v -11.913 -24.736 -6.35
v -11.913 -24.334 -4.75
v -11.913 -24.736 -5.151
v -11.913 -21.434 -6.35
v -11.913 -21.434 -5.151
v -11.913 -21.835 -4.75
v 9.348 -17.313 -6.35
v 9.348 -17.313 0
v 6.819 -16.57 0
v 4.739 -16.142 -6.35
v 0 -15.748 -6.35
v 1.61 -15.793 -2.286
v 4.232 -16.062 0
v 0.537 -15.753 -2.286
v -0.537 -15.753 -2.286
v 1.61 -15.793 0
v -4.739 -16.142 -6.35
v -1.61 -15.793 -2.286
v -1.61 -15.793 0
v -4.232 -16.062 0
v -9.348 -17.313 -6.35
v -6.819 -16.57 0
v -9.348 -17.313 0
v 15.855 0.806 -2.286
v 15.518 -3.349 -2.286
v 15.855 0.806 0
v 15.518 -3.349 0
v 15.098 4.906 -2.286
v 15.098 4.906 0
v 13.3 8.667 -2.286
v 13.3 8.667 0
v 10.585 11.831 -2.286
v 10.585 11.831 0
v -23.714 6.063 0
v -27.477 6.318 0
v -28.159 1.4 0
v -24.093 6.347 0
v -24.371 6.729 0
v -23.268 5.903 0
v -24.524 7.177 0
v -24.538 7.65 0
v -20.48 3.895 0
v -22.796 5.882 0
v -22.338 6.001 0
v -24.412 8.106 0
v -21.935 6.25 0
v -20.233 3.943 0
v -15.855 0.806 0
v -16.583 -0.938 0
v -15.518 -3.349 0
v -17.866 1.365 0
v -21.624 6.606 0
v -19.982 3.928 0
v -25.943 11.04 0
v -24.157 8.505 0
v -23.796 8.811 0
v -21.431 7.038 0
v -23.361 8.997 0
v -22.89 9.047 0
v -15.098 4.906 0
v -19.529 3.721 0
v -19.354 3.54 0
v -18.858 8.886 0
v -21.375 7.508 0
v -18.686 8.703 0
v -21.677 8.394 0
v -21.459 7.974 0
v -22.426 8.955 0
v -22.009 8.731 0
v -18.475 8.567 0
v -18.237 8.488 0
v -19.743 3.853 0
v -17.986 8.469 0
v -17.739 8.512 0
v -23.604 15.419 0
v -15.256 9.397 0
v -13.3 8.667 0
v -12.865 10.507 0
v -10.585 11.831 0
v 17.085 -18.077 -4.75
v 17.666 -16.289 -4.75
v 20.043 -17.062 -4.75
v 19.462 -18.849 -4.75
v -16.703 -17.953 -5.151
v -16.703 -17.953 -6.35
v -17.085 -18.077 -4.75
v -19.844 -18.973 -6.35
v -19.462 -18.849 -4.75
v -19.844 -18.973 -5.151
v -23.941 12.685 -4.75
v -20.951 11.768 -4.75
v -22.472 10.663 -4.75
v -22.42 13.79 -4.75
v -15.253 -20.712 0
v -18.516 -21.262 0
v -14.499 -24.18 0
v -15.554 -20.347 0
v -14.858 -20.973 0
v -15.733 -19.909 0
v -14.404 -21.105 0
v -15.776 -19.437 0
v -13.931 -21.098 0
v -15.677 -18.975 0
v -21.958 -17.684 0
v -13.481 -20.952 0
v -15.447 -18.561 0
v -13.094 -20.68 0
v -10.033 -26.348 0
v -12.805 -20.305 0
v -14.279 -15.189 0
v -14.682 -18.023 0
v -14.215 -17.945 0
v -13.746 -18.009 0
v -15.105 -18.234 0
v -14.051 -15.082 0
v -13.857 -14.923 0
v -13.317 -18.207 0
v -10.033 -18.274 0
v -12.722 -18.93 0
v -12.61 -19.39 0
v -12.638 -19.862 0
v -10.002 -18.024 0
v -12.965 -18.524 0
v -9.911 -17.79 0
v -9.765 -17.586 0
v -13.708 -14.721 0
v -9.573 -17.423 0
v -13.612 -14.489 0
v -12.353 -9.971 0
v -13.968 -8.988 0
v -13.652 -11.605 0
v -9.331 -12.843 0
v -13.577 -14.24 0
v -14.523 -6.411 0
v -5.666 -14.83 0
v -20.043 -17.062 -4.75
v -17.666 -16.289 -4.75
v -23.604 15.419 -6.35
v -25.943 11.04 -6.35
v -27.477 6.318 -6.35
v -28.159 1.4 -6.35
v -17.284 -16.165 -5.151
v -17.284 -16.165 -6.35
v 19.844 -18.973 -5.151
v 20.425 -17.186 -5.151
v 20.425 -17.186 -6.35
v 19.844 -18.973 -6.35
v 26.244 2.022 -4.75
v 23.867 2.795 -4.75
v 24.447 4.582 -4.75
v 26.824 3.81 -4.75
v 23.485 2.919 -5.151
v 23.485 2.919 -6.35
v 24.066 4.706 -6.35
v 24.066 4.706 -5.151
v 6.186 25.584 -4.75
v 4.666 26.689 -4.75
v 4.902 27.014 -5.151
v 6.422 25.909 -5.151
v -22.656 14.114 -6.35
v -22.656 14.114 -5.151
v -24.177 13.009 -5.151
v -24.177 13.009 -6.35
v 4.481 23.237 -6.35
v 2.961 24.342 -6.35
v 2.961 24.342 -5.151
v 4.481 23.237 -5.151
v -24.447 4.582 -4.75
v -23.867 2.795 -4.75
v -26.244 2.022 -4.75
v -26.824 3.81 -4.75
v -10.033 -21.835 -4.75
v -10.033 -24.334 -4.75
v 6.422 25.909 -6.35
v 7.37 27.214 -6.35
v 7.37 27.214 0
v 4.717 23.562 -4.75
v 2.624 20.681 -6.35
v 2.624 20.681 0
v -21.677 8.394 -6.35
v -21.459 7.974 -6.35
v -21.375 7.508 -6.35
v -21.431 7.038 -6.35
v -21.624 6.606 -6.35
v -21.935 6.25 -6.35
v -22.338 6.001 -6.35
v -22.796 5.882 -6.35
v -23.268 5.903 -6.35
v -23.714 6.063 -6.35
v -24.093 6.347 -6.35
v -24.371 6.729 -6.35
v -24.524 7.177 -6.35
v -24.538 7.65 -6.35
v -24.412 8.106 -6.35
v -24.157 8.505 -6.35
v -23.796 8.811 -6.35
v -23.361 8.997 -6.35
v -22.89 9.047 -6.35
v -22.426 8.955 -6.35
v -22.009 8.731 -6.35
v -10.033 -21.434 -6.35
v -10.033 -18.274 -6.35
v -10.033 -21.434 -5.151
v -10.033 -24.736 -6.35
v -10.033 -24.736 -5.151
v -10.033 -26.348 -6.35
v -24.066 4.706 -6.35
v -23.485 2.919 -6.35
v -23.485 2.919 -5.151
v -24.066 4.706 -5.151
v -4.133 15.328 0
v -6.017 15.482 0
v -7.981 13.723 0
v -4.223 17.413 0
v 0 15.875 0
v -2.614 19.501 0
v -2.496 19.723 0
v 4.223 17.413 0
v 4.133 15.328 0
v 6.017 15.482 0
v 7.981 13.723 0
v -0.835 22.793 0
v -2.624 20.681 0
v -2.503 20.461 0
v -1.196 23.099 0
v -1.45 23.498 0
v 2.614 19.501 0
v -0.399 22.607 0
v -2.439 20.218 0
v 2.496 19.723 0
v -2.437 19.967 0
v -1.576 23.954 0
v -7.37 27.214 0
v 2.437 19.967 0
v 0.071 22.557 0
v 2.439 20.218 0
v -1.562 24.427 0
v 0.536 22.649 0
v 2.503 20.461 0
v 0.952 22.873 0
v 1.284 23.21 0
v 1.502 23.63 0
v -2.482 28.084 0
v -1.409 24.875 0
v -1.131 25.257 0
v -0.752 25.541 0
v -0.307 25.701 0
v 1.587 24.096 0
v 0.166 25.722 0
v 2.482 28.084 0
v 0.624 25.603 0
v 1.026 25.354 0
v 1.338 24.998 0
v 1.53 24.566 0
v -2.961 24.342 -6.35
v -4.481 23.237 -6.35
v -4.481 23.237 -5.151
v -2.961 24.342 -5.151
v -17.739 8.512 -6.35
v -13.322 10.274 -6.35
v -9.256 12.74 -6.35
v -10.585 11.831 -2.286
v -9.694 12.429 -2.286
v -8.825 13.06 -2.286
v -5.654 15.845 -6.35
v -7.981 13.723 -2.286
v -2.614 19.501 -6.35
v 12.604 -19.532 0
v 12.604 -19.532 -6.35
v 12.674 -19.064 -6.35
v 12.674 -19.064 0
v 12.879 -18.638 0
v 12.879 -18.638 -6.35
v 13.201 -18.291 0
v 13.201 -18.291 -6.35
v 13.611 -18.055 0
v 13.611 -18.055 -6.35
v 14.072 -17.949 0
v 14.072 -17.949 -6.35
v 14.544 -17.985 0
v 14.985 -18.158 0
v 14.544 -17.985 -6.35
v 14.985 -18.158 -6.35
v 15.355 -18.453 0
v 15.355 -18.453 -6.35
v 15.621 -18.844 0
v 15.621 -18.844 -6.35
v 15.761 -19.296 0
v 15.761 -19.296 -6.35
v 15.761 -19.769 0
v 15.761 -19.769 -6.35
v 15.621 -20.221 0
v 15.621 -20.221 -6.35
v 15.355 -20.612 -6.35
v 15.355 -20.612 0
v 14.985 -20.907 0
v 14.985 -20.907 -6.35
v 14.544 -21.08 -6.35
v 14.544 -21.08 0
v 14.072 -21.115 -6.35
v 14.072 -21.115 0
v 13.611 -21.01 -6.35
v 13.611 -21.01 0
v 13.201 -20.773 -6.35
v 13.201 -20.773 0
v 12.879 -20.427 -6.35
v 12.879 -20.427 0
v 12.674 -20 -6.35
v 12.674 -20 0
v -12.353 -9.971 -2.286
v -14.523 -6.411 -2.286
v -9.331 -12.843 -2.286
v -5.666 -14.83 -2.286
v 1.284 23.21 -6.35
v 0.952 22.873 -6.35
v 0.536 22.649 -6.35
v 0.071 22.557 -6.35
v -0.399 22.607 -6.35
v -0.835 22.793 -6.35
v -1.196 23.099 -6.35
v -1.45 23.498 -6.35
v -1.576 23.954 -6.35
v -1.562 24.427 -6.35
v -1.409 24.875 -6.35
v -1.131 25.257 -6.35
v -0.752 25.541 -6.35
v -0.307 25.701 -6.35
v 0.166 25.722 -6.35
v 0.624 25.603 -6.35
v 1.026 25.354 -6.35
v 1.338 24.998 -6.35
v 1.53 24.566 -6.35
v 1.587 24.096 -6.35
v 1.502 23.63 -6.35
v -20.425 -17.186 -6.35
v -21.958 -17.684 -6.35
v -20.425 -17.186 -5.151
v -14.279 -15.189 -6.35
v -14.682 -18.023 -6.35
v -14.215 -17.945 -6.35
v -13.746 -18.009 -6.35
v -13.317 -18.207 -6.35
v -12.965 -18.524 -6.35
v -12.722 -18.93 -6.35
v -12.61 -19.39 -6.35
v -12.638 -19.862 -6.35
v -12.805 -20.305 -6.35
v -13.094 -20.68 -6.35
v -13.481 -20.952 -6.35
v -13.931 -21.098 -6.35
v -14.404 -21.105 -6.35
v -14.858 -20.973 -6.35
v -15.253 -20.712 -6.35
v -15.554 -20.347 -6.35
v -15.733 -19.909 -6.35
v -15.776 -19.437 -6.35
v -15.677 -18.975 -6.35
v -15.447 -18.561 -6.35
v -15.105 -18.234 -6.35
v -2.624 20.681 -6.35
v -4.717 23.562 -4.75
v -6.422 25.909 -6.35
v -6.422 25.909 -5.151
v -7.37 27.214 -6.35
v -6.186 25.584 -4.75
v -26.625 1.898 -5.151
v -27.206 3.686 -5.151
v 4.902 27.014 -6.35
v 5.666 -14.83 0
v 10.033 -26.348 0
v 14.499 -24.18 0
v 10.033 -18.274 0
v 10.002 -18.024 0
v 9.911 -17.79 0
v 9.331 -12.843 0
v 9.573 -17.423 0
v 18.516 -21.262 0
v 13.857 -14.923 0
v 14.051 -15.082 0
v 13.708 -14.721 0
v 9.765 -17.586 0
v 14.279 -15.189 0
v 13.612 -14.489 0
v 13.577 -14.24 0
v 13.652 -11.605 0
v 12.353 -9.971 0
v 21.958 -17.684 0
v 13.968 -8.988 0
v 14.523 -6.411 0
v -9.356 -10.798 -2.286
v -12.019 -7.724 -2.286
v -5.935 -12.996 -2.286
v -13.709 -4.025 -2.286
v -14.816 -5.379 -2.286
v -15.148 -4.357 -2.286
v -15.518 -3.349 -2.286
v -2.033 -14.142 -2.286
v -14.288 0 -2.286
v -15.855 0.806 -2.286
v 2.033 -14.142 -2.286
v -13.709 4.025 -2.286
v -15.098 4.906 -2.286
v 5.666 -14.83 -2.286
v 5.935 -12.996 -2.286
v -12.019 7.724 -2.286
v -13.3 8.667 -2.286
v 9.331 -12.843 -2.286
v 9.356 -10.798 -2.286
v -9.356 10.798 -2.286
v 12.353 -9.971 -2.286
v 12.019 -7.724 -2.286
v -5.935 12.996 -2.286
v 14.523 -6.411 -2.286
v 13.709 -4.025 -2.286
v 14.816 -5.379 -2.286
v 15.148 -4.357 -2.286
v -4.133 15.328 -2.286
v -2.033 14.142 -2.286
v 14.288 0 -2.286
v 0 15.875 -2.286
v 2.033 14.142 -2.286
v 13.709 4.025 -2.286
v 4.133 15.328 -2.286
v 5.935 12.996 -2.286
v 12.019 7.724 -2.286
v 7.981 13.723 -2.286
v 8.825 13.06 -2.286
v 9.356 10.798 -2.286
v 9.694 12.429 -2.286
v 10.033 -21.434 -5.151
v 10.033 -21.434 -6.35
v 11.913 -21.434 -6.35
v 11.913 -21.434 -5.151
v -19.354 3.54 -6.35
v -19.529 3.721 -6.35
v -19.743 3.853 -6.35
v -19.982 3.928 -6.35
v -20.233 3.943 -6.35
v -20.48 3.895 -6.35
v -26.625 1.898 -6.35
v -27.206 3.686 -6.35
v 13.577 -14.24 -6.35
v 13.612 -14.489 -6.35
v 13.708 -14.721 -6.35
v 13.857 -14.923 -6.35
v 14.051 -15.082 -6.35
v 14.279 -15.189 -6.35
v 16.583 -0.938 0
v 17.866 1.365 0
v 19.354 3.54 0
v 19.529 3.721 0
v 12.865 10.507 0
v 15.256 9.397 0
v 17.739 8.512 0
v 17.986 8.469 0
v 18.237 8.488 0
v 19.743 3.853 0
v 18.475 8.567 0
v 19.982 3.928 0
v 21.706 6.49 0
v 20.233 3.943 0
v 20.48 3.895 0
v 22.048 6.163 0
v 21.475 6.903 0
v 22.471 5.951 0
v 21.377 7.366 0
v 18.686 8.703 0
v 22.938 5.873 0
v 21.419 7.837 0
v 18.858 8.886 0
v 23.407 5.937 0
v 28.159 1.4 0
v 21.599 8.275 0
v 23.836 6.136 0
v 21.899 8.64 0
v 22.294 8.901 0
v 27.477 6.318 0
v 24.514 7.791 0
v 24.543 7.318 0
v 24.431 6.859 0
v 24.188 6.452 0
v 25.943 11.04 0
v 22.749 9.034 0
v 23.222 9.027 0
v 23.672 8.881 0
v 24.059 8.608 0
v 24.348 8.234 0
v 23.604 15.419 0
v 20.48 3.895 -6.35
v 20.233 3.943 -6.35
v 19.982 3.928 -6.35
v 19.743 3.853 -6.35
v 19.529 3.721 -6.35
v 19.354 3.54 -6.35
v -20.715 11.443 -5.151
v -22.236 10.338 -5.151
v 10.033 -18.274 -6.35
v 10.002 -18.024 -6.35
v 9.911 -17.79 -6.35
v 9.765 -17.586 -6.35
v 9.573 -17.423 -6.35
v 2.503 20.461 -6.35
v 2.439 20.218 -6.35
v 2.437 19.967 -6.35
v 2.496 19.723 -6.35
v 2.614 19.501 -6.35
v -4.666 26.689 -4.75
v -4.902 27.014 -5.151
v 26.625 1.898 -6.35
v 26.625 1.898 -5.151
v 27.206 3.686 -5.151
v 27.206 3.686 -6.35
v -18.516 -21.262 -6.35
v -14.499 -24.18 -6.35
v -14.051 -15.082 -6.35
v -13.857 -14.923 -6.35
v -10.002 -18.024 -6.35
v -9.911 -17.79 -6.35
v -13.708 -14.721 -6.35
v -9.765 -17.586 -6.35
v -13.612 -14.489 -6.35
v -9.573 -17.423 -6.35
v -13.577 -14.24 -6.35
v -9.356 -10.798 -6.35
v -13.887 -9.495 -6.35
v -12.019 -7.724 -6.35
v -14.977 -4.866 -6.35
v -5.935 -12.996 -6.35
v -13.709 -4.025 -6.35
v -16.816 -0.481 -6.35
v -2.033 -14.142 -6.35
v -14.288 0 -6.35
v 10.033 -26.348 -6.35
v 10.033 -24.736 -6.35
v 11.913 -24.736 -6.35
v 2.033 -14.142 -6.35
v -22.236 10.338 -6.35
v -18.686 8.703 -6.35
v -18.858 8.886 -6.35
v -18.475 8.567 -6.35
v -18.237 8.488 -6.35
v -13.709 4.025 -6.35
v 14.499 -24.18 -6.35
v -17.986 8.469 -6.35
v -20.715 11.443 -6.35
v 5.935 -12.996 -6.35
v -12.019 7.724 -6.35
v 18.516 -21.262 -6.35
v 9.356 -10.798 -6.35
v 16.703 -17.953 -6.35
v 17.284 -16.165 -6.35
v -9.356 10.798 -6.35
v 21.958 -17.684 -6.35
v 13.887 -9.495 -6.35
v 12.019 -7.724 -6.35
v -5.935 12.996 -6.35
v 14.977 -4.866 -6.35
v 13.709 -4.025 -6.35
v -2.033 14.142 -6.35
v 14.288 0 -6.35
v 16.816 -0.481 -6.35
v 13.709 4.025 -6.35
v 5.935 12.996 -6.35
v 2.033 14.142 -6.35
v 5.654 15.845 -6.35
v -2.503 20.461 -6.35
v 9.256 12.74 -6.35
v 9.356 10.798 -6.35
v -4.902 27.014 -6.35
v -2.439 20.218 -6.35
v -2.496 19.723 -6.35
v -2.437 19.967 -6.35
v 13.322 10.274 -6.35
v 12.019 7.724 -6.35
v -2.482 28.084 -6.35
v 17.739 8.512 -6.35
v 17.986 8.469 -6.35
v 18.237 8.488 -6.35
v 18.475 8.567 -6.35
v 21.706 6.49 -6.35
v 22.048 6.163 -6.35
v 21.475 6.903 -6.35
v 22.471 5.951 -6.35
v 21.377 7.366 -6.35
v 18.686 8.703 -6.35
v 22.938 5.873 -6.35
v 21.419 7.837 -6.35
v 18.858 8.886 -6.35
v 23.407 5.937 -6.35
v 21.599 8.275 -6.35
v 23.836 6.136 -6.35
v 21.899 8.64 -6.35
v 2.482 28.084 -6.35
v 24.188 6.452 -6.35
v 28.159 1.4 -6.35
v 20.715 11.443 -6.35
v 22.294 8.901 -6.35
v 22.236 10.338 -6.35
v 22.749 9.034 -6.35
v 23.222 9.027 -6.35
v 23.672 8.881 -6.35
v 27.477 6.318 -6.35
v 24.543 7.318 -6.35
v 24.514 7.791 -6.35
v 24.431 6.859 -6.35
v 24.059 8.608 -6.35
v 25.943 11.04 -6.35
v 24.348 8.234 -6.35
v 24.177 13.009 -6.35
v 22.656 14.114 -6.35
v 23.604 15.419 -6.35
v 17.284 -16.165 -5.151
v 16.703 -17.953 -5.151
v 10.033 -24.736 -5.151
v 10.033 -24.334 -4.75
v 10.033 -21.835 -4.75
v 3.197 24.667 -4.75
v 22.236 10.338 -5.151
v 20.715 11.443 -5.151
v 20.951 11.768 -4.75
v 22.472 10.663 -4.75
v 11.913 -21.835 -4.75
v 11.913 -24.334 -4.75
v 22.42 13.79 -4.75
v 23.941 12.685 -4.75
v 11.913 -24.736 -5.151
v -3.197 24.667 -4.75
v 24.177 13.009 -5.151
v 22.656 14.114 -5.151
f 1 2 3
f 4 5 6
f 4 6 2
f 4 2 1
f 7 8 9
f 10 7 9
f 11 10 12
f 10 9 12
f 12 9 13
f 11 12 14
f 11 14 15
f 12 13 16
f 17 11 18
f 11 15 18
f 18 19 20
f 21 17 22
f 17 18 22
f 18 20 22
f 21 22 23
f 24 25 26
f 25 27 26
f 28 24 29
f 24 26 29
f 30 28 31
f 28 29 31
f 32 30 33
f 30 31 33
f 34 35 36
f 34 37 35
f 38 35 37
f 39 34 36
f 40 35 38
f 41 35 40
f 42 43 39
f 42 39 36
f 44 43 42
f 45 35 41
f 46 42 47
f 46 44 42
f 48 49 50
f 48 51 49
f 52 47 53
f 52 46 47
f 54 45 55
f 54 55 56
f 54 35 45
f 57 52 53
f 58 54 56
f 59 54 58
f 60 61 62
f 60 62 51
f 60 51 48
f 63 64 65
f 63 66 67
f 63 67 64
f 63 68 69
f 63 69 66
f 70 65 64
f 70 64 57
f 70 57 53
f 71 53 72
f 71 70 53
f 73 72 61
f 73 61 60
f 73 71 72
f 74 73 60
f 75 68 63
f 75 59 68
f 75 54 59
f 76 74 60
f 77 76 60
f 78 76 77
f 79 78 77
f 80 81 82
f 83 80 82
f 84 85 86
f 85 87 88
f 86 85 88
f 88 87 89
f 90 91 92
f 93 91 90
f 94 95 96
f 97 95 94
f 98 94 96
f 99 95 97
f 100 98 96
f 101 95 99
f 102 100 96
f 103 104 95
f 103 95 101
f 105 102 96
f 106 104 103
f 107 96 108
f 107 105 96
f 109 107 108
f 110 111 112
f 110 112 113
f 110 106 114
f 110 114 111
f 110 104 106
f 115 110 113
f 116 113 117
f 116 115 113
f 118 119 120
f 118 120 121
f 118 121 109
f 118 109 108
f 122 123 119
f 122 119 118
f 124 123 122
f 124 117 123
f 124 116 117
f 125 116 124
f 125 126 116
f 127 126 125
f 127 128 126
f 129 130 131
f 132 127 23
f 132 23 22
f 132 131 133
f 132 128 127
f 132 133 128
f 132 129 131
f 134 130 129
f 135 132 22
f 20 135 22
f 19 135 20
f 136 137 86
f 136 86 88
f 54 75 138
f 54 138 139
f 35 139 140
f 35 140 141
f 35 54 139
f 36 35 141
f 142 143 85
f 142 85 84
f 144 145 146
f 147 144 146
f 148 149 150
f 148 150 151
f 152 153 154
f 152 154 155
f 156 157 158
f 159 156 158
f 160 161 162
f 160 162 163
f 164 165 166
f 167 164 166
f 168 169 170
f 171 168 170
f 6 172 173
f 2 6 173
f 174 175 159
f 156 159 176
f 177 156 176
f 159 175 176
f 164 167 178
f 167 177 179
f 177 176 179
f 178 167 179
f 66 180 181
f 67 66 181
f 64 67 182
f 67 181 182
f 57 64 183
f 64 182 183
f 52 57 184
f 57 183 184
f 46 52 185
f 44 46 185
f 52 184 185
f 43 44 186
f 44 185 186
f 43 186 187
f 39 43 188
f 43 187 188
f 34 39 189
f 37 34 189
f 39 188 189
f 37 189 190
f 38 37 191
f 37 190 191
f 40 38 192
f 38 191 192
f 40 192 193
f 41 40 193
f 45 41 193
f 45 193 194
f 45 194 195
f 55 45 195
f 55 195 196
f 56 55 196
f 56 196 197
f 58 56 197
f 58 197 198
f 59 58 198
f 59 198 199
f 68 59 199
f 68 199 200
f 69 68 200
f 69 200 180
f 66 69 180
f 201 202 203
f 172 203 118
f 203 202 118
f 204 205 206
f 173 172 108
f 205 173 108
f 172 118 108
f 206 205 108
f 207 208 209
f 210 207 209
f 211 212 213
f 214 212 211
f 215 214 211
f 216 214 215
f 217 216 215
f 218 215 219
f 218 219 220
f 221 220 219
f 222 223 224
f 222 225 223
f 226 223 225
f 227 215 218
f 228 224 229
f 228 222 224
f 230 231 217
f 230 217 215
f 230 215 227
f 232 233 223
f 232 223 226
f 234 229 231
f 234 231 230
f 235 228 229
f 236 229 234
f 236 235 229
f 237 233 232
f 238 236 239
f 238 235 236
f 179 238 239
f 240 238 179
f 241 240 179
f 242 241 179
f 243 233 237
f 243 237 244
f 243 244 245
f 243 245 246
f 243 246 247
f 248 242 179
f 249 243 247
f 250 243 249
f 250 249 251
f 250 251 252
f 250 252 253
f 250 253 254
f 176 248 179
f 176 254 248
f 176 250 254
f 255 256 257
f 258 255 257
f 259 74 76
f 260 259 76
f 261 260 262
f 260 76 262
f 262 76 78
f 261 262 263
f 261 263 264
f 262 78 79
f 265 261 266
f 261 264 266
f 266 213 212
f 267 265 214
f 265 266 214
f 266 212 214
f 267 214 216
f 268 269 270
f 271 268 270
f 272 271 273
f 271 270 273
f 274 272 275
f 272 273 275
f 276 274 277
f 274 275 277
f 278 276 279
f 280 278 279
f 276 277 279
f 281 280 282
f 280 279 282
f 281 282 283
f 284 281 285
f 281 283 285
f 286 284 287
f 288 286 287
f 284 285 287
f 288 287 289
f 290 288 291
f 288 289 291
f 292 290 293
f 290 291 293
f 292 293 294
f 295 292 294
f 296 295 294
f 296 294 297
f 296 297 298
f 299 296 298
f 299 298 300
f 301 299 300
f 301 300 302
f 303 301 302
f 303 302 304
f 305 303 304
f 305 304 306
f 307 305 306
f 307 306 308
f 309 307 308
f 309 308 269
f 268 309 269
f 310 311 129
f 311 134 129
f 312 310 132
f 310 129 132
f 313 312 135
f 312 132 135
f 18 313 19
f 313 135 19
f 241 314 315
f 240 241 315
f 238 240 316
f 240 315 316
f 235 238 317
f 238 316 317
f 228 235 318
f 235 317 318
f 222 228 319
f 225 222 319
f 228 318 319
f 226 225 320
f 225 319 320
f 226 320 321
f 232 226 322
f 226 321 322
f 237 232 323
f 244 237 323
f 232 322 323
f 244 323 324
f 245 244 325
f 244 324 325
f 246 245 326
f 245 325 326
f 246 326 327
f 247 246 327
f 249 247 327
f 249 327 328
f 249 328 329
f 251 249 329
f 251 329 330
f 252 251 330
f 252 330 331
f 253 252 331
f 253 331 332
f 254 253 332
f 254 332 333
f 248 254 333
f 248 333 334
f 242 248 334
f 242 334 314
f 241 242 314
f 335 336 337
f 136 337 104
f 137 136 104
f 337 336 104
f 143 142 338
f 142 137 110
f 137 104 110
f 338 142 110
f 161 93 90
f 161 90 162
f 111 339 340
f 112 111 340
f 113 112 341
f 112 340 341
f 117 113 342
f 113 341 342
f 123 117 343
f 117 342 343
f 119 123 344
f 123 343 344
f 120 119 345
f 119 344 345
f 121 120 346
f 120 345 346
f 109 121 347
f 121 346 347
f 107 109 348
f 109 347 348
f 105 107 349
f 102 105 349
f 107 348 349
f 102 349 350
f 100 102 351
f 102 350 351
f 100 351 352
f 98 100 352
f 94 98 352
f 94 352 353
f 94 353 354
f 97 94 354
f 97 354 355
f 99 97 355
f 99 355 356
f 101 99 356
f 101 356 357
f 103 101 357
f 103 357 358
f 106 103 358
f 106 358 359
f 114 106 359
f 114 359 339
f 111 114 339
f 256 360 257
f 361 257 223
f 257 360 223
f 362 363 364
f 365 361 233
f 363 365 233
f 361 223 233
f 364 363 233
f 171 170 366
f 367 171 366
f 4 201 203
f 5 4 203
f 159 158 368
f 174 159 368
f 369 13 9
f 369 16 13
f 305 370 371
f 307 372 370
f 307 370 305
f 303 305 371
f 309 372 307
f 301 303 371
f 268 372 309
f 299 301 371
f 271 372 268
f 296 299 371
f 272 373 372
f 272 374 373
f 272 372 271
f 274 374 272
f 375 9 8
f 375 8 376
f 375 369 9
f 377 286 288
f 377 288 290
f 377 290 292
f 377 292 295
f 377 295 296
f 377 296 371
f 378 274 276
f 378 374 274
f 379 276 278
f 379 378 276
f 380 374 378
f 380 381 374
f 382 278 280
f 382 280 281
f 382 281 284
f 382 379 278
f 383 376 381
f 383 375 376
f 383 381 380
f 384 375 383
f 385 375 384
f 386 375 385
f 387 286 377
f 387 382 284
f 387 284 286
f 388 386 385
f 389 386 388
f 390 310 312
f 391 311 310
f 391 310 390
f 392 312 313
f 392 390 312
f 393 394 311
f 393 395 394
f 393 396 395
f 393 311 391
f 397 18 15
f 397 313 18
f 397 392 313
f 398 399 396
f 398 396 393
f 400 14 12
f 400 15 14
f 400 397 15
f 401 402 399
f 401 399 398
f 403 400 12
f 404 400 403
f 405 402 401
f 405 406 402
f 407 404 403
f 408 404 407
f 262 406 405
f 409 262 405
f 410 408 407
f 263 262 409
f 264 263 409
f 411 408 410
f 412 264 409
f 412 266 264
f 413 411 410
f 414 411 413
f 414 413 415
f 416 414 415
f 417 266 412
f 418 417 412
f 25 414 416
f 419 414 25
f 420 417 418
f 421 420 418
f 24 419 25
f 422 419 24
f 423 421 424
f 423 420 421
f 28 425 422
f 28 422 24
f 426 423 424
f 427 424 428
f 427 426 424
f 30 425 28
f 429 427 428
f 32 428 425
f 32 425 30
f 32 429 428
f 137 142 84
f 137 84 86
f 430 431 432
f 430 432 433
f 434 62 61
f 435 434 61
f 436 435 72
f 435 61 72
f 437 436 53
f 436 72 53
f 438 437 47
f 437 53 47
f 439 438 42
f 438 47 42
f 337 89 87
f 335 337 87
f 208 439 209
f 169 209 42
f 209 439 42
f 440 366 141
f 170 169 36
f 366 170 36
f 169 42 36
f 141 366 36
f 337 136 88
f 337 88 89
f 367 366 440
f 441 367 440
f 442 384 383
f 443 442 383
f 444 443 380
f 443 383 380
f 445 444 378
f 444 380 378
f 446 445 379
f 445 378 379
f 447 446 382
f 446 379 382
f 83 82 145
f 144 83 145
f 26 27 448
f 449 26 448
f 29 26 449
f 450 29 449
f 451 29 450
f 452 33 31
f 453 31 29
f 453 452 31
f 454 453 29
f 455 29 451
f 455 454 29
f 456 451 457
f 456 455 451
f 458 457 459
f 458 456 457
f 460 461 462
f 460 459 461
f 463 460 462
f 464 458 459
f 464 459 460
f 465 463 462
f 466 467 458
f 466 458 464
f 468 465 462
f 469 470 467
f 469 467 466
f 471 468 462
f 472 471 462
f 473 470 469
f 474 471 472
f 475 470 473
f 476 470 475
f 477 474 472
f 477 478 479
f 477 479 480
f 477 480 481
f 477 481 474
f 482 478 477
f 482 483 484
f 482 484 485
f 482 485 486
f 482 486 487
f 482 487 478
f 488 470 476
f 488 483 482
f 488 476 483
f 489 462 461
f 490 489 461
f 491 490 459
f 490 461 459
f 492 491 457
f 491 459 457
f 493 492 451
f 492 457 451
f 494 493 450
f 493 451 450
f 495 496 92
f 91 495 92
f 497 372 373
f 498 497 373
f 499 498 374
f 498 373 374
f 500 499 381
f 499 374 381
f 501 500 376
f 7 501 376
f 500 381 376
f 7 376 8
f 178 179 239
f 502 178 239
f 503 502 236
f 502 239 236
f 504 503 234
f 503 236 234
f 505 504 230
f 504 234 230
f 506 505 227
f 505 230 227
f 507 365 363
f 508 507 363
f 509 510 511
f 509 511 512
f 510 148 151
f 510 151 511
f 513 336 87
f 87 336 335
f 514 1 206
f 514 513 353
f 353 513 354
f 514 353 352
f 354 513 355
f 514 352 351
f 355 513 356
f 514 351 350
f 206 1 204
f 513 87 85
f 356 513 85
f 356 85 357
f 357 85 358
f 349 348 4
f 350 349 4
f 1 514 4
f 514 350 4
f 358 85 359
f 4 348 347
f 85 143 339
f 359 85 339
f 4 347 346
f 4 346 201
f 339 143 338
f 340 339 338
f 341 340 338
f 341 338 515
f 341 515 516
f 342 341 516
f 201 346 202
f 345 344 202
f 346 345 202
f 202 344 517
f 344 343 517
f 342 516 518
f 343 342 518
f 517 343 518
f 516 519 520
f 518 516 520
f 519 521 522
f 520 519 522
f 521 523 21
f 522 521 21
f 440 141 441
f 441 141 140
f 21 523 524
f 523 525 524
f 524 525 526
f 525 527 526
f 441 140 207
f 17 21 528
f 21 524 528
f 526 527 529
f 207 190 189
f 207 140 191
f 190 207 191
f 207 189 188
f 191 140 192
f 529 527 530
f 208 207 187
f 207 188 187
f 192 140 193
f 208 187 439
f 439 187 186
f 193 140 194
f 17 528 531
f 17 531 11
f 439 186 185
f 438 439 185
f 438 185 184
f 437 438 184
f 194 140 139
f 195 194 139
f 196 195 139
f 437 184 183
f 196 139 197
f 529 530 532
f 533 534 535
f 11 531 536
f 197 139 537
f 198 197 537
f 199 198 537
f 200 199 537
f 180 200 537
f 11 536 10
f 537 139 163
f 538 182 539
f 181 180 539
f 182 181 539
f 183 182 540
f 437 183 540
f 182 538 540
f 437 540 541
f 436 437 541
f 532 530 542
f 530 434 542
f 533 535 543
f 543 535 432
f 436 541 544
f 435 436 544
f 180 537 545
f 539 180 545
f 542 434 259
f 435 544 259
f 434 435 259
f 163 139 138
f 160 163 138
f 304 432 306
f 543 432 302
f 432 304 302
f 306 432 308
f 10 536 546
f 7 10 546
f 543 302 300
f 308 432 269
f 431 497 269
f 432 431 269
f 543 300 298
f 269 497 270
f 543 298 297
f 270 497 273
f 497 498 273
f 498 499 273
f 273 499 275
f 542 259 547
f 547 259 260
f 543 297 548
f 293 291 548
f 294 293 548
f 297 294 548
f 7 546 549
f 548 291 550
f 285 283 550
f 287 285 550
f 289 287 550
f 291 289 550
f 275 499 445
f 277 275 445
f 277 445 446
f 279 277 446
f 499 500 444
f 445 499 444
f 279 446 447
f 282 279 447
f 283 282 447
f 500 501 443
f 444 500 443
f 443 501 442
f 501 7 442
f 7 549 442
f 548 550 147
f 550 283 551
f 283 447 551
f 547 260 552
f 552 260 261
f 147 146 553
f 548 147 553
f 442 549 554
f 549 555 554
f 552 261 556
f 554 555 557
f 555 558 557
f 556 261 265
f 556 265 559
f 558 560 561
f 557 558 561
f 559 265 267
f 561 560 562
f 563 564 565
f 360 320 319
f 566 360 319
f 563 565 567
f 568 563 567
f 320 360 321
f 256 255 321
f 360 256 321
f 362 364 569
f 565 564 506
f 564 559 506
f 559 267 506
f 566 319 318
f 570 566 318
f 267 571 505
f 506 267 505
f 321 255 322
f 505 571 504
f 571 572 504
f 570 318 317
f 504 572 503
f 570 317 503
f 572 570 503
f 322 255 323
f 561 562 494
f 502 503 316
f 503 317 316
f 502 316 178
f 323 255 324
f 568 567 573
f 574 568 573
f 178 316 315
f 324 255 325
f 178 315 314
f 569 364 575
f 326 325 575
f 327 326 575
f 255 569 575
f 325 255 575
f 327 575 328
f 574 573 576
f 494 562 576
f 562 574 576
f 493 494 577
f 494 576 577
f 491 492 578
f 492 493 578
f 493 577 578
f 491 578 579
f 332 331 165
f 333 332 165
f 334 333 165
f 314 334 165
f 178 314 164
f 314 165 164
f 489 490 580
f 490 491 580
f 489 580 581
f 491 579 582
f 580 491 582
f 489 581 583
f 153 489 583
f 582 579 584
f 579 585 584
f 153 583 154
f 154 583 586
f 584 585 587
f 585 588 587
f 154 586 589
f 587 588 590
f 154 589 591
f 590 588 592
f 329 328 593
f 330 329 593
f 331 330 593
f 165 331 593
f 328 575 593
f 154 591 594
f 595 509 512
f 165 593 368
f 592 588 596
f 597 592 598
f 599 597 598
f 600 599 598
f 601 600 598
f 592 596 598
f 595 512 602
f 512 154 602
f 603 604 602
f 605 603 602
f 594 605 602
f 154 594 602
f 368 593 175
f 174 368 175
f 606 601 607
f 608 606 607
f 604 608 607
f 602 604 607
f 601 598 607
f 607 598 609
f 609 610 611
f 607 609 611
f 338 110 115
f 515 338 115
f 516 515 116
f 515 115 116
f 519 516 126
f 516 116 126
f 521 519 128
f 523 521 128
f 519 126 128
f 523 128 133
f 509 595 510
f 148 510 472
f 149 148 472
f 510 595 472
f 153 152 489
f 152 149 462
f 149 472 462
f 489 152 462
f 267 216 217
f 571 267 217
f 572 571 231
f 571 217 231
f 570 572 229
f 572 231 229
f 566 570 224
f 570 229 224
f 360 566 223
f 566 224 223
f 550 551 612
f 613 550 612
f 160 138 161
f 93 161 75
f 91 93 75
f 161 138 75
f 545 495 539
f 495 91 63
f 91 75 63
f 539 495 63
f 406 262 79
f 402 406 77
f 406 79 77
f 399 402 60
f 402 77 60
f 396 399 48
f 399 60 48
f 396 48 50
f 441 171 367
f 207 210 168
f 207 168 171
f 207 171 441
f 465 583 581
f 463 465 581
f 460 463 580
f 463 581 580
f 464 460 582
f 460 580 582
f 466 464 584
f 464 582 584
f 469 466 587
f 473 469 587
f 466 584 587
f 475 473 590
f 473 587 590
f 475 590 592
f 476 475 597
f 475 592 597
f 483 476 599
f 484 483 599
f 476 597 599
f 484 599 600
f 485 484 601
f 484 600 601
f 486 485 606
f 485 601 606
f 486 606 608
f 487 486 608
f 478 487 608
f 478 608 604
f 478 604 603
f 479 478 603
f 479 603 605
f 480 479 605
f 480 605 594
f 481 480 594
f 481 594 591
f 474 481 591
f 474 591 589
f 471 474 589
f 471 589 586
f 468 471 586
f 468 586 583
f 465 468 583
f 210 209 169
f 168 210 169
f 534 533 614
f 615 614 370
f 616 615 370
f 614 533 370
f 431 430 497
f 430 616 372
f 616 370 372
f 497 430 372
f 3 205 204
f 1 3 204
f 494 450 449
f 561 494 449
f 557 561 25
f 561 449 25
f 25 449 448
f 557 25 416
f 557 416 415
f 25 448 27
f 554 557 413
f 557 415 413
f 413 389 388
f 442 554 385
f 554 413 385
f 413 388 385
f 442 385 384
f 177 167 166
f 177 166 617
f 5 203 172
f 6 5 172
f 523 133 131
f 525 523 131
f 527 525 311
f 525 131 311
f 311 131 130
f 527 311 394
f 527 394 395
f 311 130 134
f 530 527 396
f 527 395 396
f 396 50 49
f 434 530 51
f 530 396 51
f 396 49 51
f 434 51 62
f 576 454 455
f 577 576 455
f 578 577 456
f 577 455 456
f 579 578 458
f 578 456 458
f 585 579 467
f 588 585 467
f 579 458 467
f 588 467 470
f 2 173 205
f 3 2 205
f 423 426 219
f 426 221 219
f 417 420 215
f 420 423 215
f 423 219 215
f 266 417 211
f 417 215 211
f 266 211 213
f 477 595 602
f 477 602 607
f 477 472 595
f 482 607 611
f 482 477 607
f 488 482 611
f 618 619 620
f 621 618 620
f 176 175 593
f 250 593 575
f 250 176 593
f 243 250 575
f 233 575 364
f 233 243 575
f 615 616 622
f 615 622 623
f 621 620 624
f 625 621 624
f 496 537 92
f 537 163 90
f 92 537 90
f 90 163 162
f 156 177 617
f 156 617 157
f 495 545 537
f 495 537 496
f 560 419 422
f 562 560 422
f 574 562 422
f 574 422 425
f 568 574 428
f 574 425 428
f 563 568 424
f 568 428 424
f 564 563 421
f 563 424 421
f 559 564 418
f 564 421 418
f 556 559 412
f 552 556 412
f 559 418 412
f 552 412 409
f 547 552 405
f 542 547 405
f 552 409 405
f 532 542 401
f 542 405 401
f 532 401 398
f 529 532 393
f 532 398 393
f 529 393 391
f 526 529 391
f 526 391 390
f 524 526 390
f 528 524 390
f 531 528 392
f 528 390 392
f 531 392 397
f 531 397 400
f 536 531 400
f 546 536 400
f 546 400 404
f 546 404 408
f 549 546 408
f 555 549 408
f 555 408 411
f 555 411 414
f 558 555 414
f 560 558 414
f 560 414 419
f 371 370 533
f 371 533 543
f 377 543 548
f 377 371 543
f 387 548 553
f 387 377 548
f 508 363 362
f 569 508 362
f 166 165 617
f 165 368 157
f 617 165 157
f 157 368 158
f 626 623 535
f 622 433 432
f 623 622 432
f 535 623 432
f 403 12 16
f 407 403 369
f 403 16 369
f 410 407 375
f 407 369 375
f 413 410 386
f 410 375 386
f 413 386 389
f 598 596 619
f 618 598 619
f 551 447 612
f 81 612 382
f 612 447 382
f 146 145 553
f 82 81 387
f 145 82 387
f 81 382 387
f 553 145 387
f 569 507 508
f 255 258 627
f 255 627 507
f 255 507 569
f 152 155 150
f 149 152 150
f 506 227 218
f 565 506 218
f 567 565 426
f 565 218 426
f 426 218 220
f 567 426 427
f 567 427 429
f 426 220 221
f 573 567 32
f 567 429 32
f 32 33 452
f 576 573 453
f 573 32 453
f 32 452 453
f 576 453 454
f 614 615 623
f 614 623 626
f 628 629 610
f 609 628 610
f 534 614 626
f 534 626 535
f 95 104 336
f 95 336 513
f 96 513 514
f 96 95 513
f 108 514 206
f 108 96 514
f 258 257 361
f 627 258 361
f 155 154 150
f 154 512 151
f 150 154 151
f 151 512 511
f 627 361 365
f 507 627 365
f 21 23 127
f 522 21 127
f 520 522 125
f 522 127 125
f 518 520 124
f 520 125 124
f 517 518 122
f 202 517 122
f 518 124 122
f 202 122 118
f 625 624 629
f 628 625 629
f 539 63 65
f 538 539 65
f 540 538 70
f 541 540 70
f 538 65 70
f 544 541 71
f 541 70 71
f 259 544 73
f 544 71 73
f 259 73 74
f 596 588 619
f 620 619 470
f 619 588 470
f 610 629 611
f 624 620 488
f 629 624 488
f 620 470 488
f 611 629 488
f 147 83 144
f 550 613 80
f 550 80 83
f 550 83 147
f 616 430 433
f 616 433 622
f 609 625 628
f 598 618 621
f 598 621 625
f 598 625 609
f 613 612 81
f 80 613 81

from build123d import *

# Parameters (mm, degrees)
SKETCH1_R                = 28.194
SKETCH1_R_2              = 14.2875
BOSS_EXTRUDE1_DEPTH      = 6.35
SKETCH1_3_R              = 15.875
SKETCH1_3_R_2            = 14.2875
CUT_EXTRUDE1_DEPTH       = 2.286
CUT_EXTRUDE5_DEPTH       = 41.374816062
CIRPATTERN1_COUNT        = 5
CUT_EXTRUDE6_DEPTH       = 1.8796
CIRPATTERN2_COUNT        = 5
CIRPATTERN2_COPY_1_DEPTH = 1.8796
CIRPATTERN2_COPY_2_DEPTH = 1.8796
CIRPATTERN2_COPY_3_DEPTH = 1.8796
CIRPATTERN2_COPY_4_DEPTH = 1.8796
SKETCH4_R                = 1.5875
CUT_EXTRUDE7_DEPTH       = 41.350542006
CIRPATTERN3_COUNT        = 5


with BuildPart() as part:
    # Sketch1 → Boss-Extrude1 (new body)
    with BuildSketch(Plane.XY):
        Circle(SKETCH1_R)
        Circle(SKETCH1_R_2, mode=Mode.SUBTRACT)
    extrude(amount=-BOSS_EXTRUDE1_DEPTH)

    # Sketch1<3> → Cut-Extrude1 (cut)
    with BuildSketch(Plane.XY):
        Circle(SKETCH1_3_R)
        Circle(SKETCH1_3_R_2, mode=Mode.SUBTRACT)
    extrude(amount=-CUT_EXTRUDE1_DEPTH, mode=Mode.SUBTRACT)

    # Sketch2 → Cut-Extrude5 (cut, through all)
    with BuildSketch(Plane.XY):
        with BuildLine():
            Line((-10.033, -28.194), (10.033, -28.194))
            Line((10.033, -28.194), (10.033, -18.273516145))
            ThreePointArc((10.033, -18.273516145), (9.84417878, -17.683574397), (9.347899083, -17.312911233))
            ThreePointArc((9.347899083, -17.312911233), (0, -15.748), (-9.347899083, -17.312911233))
            ThreePointArc((-9.347899083, -17.312911233), (-9.84417878, -17.683574397), (-10.033, -18.273516145))
            Line((-10.033, -18.273516145), (-10.033, -28.194))
        make_face()
    cut_extrude5 = extrude(amount=-CUT_EXTRUDE5_DEPTH, mode=Mode.SUBTRACT)

    # CirPattern1: Cut-Extrude5 ×5 about axis
    cirpattern1_axis = Axis((0, 0, 0), (0, 0, 1))
    for i in range(1, CIRPATTERN1_COUNT):
        add(cut_extrude5.rotate(cirpattern1_axis, i * 360 / CIRPATTERN1_COUNT), mode=Mode.SUBTRACT)

    # Sketch3 → Cut-Extrude6 (cut)
    with BuildSketch(Plane(origin=(-10.033, 0, 0), x_dir=(0, 0, -1), z_dir=(1, 0, 0))):
        Polygon((6.35, -21.433544869), (5.15112, -21.433544869), (4.7498, -21.834864869), (4.7498, -24.334224869), (5.15112, -24.735544869), (6.35, -24.735544869), align=None)
    cut_extrude6 = extrude(amount=-CUT_EXTRUDE6_DEPTH, mode=Mode.SUBTRACT)

    # Mirror1: Cut-Extrude6 across plane
    add(cut_extrude6.mirror(Plane(origin=(0, 0, 0), x_dir=(0, 0, 1), z_dir=(1, 0, 0))), mode=Mode.SUBTRACT)

    # CirPattern2: Cut-Extrude6 ×5 about axis
    cirpattern2_axis = Axis((0, 0, -6.35), (0, 0, 1))
    for i in range(1, CIRPATTERN2_COUNT):
        add(cut_extrude6.rotate(cirpattern2_axis, i * 360 / CIRPATTERN2_COUNT), mode=Mode.SUBTRACT)

    # CirPattern2 copy 1 sketch → CirPattern2 copy 1 (cut)
    with BuildSketch(Plane(origin=(3.100367505, 9.541950028, 0), x_dir=(0, 0, -1), z_dir=(-0.3090169943749473, -0.9510565162951535, 0))):
        Polygon((6.35, 21.433544869), (5.15112, 21.433544869), (4.7498, 21.834864869), (4.7498, 24.334224869), (5.15112, 24.735544869), (6.35, 24.735544869), align=None)
    extrude(amount=-CIRPATTERN2_COPY_1_DEPTH, mode=Mode.SUBTRACT)

    # CirPattern2 copy 2 sketch → CirPattern2 copy 2 (cut)
    with BuildSketch(Plane(origin=(-8.116867505, 5.897249436, 0), x_dir=(0, 0, -1), z_dir=(0.8090169943749475, -0.5877852522924731, 0))):
        Polygon((6.35, 21.433544869), (5.15112, 21.433544869), (4.7498, 21.834864869), (4.7498, 24.334224869), (5.15112, 24.735544869), (6.35, 24.735544869), align=None)
    extrude(amount=-CIRPATTERN2_COPY_2_DEPTH, mode=Mode.SUBTRACT)

    # CirPattern2 copy 3 sketch → CirPattern2 copy 3 (cut)
    with BuildSketch(Plane(origin=(-8.116867505, -5.897249436, 0), x_dir=(0, 0, -1), z_dir=(0.8090169943749475, 0.5877852522924731, 0))):
        Polygon((6.35, 21.433544869), (5.15112, 21.433544869), (4.7498, 21.834864869), (4.7498, 24.334224869), (5.15112, 24.735544869), (6.35, 24.735544869), align=None)
    extrude(amount=-CIRPATTERN2_COPY_3_DEPTH, mode=Mode.SUBTRACT)

    # CirPattern2 copy 4 sketch → CirPattern2 copy 4 (cut)
    with BuildSketch(Plane(origin=(3.100367505, -9.541950028, 0), x_dir=(0, 0, -1), z_dir=(-0.3090169943749474, 0.9510565162951536, 0))):
        Polygon((6.35, 21.433544869), (5.15112, 21.433544869), (4.7498, 21.834864869), (4.7498, 24.334224869), (5.15112, 24.735544869), (6.35, 24.735544869), align=None)
    extrude(amount=-CIRPATTERN2_COPY_4_DEPTH, mode=Mode.SUBTRACT)

    # Sketch4 → Cut-Extrude7 (cut, through all)
    with BuildSketch(Plane(origin=(0, 0, -6.35), x_dir=(-1, 0, 0), z_dir=(0, 0, -1))):
        with Locations((-14.191068427, -19.532330016)):
            Circle(SKETCH4_R)
    cut_extrude7 = extrude(amount=-CUT_EXTRUDE7_DEPTH, mode=Mode.SUBTRACT)

    # CirPattern3: Cut-Extrude7 ×5 about axis
    cirpattern3_axis = Axis((0, 0, -6.35), (0, 0, 1))
    for i in range(1, CIRPATTERN3_COUNT):
        add(cut_extrude7.rotate(cirpattern3_axis, i * 360 / CIRPATTERN3_COUNT), mode=Mode.SUBTRACT)


solid = part.part
